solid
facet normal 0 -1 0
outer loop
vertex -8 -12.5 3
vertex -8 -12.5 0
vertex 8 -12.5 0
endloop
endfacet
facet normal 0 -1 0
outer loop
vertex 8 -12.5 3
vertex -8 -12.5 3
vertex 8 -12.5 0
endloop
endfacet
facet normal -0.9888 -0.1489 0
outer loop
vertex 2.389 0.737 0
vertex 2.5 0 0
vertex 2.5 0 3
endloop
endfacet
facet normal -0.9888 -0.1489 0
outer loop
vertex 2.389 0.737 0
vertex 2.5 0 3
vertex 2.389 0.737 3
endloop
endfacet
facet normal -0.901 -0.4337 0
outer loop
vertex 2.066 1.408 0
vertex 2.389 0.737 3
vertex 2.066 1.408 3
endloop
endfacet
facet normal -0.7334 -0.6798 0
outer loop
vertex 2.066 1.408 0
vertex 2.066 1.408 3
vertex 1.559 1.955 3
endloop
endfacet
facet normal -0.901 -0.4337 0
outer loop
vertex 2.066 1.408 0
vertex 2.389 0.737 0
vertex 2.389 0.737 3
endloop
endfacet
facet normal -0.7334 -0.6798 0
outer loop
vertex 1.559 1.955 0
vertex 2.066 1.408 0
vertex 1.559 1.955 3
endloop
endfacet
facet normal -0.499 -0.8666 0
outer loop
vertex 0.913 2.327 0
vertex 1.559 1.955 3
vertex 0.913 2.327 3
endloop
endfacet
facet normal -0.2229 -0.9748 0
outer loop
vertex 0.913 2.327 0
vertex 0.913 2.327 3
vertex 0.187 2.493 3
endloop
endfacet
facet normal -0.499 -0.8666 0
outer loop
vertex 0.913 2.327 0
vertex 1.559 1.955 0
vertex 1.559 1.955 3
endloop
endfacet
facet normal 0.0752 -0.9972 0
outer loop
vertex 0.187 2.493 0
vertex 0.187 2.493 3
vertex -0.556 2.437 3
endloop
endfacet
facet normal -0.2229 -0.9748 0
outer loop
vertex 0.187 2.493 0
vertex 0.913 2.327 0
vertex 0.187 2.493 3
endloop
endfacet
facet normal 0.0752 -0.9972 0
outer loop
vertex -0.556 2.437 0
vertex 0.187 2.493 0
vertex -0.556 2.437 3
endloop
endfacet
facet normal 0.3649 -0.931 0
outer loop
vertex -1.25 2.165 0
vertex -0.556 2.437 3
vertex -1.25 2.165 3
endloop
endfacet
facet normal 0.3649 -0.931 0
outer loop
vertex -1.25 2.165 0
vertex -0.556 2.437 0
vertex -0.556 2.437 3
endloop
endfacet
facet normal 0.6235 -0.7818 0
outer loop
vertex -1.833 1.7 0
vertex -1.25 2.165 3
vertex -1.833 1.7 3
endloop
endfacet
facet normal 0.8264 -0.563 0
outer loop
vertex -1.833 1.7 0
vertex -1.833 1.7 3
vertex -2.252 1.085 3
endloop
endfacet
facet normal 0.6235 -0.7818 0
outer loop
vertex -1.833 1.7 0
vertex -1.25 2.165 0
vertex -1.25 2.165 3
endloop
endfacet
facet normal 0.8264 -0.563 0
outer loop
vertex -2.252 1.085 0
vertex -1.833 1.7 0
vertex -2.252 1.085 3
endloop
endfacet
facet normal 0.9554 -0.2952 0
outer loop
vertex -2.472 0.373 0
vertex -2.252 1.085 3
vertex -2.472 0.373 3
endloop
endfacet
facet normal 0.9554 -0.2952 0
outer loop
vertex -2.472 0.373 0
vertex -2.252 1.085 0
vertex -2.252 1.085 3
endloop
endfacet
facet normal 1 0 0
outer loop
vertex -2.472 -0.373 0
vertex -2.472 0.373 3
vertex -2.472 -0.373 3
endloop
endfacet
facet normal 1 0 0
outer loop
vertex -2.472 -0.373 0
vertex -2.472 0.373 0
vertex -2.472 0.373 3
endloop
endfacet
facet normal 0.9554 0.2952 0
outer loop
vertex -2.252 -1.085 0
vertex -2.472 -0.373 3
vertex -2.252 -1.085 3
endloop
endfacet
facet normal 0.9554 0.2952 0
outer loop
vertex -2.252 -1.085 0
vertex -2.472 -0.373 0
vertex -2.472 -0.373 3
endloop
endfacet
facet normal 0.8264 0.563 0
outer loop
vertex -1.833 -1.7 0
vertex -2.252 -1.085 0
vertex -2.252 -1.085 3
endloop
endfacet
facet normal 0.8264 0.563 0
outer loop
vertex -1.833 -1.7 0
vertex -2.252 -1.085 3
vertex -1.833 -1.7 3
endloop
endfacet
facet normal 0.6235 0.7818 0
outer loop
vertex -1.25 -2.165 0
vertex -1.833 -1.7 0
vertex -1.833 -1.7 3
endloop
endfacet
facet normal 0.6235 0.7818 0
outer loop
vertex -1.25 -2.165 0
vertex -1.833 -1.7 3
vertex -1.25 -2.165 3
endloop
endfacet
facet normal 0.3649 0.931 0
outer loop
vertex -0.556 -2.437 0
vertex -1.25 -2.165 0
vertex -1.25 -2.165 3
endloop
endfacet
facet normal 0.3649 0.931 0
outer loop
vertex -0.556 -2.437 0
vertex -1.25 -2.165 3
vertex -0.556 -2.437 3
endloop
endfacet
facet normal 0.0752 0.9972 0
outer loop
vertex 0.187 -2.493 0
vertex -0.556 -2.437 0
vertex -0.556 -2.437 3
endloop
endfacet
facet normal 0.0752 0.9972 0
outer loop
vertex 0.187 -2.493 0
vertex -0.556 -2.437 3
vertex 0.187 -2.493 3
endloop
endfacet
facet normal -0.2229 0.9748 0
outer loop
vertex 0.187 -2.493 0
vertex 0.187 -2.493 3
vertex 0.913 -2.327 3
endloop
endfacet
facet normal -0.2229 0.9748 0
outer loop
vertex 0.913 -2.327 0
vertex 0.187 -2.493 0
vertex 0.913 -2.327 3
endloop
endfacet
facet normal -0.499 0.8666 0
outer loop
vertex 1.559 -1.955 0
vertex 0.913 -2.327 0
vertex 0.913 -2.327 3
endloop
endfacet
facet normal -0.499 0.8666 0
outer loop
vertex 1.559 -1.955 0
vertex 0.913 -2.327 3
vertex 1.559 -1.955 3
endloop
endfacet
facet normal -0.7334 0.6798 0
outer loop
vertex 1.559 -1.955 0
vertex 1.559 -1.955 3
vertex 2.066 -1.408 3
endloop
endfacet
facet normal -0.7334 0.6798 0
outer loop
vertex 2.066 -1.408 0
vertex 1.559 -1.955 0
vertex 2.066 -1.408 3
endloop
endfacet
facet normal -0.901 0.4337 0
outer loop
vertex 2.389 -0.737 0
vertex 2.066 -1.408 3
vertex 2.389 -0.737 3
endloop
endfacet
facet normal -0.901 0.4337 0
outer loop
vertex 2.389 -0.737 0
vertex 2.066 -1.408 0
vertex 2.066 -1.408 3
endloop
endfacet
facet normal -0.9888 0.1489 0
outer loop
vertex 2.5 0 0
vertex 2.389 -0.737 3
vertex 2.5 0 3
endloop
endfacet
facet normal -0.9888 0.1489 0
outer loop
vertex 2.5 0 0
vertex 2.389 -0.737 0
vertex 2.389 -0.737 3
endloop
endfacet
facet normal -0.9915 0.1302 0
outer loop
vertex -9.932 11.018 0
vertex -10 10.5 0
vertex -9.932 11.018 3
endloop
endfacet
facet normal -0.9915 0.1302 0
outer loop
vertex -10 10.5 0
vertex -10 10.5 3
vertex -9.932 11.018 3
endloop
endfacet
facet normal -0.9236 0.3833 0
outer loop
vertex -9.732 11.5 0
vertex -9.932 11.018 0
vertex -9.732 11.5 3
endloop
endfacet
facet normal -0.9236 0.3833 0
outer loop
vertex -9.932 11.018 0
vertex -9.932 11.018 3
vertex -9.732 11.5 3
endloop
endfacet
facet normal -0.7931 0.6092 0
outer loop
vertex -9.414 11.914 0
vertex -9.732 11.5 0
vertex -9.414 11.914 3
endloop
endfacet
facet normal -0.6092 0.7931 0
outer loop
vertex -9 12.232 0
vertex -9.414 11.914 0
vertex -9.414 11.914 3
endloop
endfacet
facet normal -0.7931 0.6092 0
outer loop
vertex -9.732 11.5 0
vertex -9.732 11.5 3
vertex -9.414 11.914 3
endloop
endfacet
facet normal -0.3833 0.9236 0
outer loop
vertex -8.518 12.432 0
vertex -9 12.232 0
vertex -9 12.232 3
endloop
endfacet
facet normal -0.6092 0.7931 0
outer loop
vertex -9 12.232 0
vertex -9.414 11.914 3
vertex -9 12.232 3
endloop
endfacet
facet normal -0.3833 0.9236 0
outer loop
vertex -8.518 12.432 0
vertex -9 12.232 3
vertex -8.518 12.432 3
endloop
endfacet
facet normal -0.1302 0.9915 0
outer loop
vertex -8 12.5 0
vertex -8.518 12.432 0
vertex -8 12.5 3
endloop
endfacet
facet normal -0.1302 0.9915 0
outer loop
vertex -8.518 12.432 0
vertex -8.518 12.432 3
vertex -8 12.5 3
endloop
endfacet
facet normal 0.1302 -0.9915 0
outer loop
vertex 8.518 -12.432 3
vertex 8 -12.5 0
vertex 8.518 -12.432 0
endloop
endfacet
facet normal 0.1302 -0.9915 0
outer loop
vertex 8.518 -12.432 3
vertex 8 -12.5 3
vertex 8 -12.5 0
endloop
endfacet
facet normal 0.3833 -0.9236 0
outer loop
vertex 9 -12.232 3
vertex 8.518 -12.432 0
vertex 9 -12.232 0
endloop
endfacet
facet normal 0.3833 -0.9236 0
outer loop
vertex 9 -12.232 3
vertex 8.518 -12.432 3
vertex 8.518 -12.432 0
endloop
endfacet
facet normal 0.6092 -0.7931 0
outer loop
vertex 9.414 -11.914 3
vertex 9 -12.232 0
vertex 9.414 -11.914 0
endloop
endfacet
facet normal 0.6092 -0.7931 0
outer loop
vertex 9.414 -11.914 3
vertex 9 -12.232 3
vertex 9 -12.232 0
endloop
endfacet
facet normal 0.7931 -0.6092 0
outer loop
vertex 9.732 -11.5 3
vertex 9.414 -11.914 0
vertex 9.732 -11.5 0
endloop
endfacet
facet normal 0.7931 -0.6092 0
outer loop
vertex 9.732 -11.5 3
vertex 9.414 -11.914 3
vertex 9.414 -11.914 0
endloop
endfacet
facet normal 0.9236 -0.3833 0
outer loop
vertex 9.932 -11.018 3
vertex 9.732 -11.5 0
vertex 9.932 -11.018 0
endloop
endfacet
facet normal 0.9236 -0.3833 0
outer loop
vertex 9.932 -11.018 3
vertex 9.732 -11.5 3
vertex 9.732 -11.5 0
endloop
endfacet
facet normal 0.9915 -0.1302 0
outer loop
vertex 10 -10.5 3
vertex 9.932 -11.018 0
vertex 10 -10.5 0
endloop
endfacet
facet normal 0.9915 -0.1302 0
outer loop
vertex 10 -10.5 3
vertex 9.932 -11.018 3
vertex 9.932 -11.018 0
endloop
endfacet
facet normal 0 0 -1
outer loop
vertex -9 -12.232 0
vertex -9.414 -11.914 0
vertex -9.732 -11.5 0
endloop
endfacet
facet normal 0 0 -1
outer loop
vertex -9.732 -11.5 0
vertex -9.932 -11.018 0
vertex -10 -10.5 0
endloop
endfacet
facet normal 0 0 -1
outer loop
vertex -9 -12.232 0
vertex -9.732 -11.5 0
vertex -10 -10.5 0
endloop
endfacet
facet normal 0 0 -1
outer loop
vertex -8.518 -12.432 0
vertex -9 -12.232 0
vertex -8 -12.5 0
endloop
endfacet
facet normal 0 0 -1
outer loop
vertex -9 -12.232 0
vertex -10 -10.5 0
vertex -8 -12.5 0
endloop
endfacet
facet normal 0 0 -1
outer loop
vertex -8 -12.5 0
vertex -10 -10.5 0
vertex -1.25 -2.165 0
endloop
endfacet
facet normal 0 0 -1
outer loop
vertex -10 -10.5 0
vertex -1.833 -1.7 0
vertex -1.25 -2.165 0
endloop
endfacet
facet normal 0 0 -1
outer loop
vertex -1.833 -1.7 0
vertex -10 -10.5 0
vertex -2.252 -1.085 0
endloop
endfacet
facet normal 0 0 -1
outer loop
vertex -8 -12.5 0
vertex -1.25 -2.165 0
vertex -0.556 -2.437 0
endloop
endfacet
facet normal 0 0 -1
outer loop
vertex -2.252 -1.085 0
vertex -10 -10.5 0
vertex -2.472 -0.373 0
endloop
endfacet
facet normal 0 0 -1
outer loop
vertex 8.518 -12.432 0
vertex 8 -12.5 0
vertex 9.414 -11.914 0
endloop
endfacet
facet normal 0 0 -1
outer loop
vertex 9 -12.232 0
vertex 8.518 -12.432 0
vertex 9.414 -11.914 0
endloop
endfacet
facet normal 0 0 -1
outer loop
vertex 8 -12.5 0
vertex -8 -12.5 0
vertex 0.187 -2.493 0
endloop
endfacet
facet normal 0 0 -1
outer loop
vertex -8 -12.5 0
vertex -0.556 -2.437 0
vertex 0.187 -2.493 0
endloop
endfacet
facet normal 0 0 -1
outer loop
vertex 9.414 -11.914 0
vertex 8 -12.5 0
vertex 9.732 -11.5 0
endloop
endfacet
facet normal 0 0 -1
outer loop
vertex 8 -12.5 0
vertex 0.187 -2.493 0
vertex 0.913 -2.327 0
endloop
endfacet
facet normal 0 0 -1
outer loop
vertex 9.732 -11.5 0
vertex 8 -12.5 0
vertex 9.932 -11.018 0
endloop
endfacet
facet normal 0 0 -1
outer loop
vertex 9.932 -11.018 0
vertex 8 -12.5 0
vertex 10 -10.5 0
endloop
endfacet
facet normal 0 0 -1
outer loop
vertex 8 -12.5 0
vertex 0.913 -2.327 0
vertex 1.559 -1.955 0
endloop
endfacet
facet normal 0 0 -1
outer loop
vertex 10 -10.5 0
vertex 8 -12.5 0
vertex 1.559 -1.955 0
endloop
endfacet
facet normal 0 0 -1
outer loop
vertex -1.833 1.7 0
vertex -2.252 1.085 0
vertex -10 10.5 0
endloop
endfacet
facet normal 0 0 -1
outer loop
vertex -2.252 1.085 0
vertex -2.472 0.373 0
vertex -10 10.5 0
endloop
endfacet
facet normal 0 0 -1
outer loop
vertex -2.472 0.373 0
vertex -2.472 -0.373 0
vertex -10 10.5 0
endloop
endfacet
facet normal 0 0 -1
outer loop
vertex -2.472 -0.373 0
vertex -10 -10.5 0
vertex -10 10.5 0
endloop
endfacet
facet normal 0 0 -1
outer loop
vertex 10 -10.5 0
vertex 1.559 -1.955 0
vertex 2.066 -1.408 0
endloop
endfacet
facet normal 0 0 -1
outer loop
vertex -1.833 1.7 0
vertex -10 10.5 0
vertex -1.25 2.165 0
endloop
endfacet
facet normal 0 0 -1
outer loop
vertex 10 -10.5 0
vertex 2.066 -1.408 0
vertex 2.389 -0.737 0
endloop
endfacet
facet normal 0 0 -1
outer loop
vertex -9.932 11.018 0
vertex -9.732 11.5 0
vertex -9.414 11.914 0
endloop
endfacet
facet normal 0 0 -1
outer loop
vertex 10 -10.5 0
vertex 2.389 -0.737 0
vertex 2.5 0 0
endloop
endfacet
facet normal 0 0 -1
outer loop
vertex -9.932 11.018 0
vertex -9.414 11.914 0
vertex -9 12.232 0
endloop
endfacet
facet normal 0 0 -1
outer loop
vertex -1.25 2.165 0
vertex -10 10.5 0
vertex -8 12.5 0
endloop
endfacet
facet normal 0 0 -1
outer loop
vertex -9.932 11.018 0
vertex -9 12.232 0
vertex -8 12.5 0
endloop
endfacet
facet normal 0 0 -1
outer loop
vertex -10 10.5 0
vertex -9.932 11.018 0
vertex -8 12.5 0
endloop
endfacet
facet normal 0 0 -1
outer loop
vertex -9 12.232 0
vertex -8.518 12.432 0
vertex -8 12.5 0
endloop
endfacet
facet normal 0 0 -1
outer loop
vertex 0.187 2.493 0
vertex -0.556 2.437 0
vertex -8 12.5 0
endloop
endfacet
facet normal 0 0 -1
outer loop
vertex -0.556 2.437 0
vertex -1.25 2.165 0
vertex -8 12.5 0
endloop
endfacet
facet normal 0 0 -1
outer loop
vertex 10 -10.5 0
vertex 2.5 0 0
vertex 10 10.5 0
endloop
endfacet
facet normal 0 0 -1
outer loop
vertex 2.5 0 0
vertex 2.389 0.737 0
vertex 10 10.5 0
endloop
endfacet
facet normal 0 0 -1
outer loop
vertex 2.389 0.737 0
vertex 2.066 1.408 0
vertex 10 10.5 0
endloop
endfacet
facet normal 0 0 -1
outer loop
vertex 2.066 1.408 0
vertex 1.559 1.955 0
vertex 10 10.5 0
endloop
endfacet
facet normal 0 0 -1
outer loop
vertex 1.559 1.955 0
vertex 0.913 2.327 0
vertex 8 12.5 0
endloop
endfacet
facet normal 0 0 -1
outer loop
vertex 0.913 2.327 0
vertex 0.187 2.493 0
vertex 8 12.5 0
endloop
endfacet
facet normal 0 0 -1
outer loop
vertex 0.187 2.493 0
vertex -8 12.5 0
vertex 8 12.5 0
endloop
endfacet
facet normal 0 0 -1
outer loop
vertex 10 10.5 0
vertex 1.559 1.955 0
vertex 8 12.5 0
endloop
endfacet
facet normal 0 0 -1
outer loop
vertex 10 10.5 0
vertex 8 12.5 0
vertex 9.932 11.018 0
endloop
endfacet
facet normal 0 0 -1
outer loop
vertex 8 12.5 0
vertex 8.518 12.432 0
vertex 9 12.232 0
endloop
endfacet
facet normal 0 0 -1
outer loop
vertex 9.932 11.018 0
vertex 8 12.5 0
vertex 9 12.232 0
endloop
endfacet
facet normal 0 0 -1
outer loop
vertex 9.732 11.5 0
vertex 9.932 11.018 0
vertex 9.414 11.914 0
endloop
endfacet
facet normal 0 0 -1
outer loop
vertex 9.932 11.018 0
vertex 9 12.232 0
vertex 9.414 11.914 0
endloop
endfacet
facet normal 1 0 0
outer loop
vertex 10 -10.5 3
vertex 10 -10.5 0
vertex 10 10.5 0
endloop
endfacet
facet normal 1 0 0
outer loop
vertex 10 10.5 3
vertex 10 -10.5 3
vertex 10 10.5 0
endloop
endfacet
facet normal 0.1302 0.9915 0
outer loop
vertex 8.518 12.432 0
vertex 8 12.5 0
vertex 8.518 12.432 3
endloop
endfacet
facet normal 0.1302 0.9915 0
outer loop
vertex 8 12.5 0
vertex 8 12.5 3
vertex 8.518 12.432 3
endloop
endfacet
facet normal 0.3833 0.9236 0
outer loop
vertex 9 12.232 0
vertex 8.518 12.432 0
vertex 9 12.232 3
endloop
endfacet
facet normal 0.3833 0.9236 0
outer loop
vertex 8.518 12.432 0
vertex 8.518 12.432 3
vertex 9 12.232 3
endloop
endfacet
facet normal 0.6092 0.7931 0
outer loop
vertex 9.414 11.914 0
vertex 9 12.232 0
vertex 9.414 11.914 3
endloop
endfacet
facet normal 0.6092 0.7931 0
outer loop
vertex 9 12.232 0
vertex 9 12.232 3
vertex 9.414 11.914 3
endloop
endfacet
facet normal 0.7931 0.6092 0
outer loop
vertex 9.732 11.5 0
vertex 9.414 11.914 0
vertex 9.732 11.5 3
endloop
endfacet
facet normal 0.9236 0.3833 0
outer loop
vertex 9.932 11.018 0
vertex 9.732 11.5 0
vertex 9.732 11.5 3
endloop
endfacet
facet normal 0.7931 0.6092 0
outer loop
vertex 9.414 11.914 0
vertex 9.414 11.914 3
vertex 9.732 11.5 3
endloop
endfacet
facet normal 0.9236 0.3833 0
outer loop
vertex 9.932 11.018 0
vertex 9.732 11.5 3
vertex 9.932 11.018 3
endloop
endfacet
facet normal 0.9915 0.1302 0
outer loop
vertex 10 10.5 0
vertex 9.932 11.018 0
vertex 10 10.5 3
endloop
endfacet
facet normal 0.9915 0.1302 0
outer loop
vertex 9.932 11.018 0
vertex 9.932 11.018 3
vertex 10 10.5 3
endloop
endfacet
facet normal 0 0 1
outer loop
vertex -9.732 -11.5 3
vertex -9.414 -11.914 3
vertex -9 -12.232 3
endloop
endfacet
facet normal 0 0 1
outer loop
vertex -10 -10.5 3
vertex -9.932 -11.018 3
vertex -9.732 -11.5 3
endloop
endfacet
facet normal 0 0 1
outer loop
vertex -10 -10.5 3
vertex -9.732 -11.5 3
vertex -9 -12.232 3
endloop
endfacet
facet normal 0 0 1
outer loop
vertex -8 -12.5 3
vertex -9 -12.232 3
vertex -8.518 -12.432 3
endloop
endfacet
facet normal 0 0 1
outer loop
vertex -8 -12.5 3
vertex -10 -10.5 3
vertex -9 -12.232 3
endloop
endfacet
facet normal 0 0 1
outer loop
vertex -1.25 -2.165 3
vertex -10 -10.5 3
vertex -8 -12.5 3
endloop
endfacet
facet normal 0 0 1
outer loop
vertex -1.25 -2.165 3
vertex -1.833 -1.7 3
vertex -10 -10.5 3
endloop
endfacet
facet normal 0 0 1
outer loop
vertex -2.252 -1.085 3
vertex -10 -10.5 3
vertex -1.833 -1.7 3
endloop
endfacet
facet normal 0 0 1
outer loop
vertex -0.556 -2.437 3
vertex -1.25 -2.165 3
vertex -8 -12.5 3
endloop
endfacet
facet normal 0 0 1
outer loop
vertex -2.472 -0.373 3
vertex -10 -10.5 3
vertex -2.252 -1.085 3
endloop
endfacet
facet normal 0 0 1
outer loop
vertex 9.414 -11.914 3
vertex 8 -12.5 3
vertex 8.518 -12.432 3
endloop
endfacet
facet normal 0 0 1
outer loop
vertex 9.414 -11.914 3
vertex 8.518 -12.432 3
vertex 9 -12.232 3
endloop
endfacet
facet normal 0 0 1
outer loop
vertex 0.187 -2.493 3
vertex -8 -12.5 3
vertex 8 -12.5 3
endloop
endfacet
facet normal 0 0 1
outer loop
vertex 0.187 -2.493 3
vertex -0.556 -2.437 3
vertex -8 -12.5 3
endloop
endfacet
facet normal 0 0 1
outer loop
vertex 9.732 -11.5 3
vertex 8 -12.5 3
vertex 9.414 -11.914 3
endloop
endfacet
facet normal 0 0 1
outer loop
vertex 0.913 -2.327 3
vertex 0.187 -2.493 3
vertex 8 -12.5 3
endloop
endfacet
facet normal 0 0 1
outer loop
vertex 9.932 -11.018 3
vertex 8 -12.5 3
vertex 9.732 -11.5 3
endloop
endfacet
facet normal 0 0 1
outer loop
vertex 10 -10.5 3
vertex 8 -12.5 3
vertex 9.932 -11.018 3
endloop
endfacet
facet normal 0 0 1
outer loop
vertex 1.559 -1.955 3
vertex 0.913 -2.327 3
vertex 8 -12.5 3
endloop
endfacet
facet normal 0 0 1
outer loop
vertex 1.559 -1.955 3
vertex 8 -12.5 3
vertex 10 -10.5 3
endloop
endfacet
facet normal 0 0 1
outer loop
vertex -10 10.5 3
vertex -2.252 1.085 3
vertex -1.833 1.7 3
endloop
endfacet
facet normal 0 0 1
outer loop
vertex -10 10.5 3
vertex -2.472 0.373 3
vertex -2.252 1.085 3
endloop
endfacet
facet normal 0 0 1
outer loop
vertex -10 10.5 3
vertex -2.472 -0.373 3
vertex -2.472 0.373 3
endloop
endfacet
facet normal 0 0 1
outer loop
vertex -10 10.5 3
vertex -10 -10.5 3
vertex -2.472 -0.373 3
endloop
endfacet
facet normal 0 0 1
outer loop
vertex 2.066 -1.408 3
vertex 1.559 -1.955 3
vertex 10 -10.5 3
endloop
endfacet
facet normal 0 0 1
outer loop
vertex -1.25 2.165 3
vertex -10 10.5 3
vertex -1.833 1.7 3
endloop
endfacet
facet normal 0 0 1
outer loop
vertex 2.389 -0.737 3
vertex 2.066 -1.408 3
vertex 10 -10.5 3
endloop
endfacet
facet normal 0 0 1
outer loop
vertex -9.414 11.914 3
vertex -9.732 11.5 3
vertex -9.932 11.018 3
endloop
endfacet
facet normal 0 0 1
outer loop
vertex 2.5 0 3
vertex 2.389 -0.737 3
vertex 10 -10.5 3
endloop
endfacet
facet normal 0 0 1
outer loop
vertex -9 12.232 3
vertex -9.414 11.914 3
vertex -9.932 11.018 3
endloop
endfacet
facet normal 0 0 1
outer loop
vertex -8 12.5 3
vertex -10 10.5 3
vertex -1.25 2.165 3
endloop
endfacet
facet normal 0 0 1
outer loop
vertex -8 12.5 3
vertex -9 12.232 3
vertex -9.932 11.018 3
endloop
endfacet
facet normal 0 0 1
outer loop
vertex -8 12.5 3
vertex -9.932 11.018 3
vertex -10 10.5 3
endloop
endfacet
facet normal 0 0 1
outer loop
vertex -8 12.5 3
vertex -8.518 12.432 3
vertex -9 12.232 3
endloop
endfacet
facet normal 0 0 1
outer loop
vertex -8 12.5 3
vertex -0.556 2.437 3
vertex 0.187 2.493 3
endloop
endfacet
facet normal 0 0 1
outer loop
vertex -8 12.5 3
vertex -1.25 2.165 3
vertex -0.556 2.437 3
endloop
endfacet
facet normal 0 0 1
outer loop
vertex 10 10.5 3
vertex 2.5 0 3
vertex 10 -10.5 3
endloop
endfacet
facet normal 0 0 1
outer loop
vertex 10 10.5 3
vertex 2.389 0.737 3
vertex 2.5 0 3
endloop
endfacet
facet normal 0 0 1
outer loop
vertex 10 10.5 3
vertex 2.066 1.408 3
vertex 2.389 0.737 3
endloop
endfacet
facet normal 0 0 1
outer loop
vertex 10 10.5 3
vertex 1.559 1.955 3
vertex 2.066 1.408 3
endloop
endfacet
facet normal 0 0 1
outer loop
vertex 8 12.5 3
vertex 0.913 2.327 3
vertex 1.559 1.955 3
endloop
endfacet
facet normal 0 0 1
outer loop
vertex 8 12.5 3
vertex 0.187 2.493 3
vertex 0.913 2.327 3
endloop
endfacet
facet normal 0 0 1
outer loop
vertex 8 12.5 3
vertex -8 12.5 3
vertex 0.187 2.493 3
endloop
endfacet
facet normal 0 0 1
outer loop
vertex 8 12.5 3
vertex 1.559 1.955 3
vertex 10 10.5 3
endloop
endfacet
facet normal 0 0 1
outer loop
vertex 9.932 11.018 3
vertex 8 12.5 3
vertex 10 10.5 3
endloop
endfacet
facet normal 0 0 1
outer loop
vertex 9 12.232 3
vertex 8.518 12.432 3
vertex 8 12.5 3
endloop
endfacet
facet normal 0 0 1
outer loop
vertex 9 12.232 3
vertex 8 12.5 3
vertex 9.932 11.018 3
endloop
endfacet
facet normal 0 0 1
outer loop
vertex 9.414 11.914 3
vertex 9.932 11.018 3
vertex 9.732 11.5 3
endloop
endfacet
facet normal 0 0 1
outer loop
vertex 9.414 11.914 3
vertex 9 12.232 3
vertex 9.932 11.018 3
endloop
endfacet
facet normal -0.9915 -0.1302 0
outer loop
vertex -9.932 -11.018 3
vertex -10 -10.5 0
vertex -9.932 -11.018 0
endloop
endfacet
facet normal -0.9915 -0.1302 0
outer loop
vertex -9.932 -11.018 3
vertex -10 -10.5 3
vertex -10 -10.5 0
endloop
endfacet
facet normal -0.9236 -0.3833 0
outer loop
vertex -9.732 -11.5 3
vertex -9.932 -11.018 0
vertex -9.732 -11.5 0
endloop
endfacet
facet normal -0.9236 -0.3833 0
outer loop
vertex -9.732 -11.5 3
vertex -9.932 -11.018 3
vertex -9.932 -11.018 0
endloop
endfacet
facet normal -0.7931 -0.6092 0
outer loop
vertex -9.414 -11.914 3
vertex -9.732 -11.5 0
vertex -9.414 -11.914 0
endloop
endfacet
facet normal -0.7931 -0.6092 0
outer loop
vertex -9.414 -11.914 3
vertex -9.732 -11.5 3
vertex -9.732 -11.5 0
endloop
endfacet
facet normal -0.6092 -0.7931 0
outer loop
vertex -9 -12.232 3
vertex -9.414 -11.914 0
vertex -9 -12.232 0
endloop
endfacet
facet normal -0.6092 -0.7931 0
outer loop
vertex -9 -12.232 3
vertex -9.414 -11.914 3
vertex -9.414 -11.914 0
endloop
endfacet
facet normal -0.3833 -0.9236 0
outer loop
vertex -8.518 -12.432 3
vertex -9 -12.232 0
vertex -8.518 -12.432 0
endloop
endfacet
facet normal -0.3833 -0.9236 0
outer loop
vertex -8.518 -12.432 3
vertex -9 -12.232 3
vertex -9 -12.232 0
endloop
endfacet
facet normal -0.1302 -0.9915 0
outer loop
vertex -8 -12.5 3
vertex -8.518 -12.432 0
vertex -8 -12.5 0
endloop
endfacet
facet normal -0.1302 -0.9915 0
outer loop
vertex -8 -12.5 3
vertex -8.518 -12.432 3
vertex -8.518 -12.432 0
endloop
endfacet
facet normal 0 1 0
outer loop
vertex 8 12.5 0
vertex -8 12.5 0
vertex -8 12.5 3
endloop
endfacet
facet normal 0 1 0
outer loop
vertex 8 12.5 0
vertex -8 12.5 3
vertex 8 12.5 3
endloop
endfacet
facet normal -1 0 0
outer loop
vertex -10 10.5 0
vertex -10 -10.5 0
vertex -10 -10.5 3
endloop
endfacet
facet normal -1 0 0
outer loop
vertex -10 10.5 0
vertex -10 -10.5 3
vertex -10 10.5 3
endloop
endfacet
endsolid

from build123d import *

# Parameters (mm, degrees)
ESQUISSE1_W        = 20
ESQUISSE1_H        = 25
ESQUISSE1_R        = 2.5
BOSS_EXTRU_1_DEPTH = 3
CONG_1_R           = 2


with BuildPart() as part:
    # Esquisse1 → Boss.-Extru.1 (new body)
    with BuildSketch(Plane.XY):
        Rectangle(ESQUISSE1_W, ESQUISSE1_H)
        Circle(ESQUISSE1_R, mode=Mode.SUBTRACT)
    extrude(amount=BOSS_EXTRU_1_DEPTH)

    # Congé1
    cong_1_edges = [part.edges().sort_by_distance(p)[0] for p in [
        (-10, 12.5, 1.5),
        (10, 12.5, 1.5),
        (10, -12.5, 1.5),
        (-10, -12.5, 1.5),
    ]]
    fillet(cong_1_edges, radius=CONG_1_R)


solid = part.part
